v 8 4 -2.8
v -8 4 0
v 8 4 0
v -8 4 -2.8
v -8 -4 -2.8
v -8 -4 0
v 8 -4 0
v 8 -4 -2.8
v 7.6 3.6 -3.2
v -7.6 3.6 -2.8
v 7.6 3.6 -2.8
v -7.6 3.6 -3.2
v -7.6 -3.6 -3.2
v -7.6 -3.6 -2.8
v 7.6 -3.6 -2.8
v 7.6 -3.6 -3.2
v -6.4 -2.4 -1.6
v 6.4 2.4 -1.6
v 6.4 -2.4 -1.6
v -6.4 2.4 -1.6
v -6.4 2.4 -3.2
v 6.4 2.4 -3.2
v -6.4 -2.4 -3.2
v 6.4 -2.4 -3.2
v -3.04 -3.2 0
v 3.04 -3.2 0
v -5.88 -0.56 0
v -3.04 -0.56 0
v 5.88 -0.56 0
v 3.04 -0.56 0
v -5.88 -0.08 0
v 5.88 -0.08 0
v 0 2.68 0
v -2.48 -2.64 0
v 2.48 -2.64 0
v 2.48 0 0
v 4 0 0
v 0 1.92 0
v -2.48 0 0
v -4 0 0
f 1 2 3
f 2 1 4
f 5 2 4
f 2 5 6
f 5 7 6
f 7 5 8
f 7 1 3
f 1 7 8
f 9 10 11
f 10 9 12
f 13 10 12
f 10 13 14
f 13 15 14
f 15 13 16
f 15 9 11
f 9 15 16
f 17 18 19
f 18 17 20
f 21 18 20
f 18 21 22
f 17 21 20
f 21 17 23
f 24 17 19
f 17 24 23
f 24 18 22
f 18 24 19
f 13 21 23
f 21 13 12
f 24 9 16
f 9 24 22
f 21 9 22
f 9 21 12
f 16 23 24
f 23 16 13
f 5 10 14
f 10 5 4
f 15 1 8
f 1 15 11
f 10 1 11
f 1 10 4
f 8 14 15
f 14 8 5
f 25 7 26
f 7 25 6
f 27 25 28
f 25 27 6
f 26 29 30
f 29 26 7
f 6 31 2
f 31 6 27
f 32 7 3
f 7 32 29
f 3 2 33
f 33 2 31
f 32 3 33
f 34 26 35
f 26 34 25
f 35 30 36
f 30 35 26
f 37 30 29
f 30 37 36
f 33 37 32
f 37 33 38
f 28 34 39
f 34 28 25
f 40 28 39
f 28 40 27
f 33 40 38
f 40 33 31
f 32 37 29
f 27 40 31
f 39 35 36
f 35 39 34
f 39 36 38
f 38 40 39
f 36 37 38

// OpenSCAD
// file: ../p/box5.scad
use <../lib.scad>
function ldraw_lib__box5() = [
// 0 Box with 5 Faces and All Edges
// 0 Name: box5.dat
// 0 Author: James Jessiman
// 0 !LDRAW_ORG Primitive UPDATE 2012-01
// 0 !LICENSE Licensed under CC BY 2.0 and CC BY 4.0 : see CAreadme.txt
// 
// 0 BFC CERTIFY CCW
  [0,"BFC","CERTIFY"],
  [0,"BFC","CCW"],
// 
// 0 !HISTORY 2002-04-03 [sbliss] Modified for BFC compliance
// 0 !HISTORY 2002-04-25 [PTadmin] Official Update 2002-02
// 0 !HISTORY 2007-06-24 [PTadmin] Header formatted for Contributor Agreement
// 0 !HISTORY 2008-07-01 [PTadmin] Official Update 2008-01
// 0 !HISTORY 2012-02-16 [Philo] Changed to CCW
// 0 !HISTORY 2012-03-30 [PTadmin] Official Update 2012-01
// 
// 
// 2 24 1 1 1 -1 1 1
  [2,24,1,1,1,-1,1,1],
// 2 24 -1 1 1 -1 1 -1
  [2,24,-1,1,1,-1,1,-1],
// 2 24 -1 1 -1 1 1 -1
  [2,24,-1,1,-1,1,1,-1],
// 2 24 1 1 -1 1 1 1
  [2,24,1,1,-1,1,1,1],
// 2 24 1 0 1 -1 0 1
  [2,24,1,0,1,-1,0,1],
// 2 24 -1 0 1 -1 0 -1
  [2,24,-1,0,1,-1,0,-1],
// 2 24 -1 0 -1 1 0 -1
  [2,24,-1,0,-1,1,0,-1],
// 2 24 1 0 -1 1 0 1
  [2,24,1,0,-1,1,0,1],
// 2 24 1 0 1 1 1 1
  [2,24,1,0,1,1,1,1],
// 2 24 -1 0 1 -1 1 1
  [2,24,-1,0,1,-1,1,1],
// 2 24 1 0 -1 1 1 -1
  [2,24,1,0,-1,1,1,-1],
// 2 24 -1 0 -1 -1 1 -1
  [2,24,-1,0,-1,-1,1,-1],
// 4 16 -1 1 1 1 1 1 1 1 -1 -1 1 -1
  [4,16,-1,1,1,1,1,1,1,1,-1,-1,1,-1],
// 4 16 -1 1 1 -1 0 1 1 0 1 1 1 1
  [4,16,-1,1,1,-1,0,1,1,0,1,1,1,1],
// 4 16 -1 1 -1 -1 0 -1 -1 0 1 -1 1 1
  [4,16,-1,1,-1,-1,0,-1,-1,0,1,-1,1,1],
// 4 16 1 1 -1 1 0 -1 -1 0 -1 -1 1 -1
  [4,16,1,1,-1,1,0,-1,-1,0,-1,-1,1,-1],
// 4 16 1 1 1 1 0 1 1 0 -1 1 1 -1
  [4,16,1,1,1,1,0,1,1,0,-1,1,1,-1],
];
module ldraw_lib__box5(step=0, col=false, unit=2/5, alt=false, line=0.2, solid=!$preview)
    makepoly(ldraw_lib__box5(), step=step, col=col, unit=unit, alt=alt, line=line, solid=solid);
ldraw_lib__box5(line=0.2);
// file: ../p/box4.scad
use <../lib.scad>
function ldraw_lib__box4() = [
// 0 Box with 4 Faces (2 Parallel Pairs) and All Edges
// 0 Name: box4.dat
// 0 Author: James Jessiman
// 0 !LDRAW_ORG Primitive UPDATE 2012-01
// 0 !LICENSE Licensed under CC BY 2.0 and CC BY 4.0 : see CAreadme.txt
// 
// 0 BFC CERTIFY CCW
  [0,"BFC","CERTIFY"],
  [0,"BFC","CCW"],
// 
// 0 !HISTORY 2002-04-03 [sbliss] Modified for BFC compliance
// 0 !HISTORY 2002-04-25 [PTadmin] Official Update 2002-02
// 0 !HISTORY 2007-06-24 [PTadmin] Header formatted for Contributor Agreement
// 0 !HISTORY 2008-07-01 [PTadmin] Official Update 2008-01
// 0 !HISTORY 2012-02-16 [Philo] Changed to CCW
// 0 !HISTORY 2012-03-30 [PTadmin] Official Update 2012-01
// 
// 
// 2 24 1 1 1 -1 1 1
  [2,24,1,1,1,-1,1,1],
// 2 24 -1 1 1 -1 1 -1
  [2,24,-1,1,1,-1,1,-1],
// 2 24 -1 1 -1 1 1 -1
  [2,24,-1,1,-1,1,1,-1],
// 2 24 1 1 -1 1 1 1
  [2,24,1,1,-1,1,1,1],
// 2 24 1 0 1 -1 0 1
  [2,24,1,0,1,-1,0,1],
// 2 24 -1 0 1 -1 0 -1
  [2,24,-1,0,1,-1,0,-1],
// 2 24 -1 0 -1 1 0 -1
  [2,24,-1,0,-1,1,0,-1],
// 2 24 1 0 -1 1 0 1
  [2,24,1,0,-1,1,0,1],
// 2 24 1 0 1 1 1 1
  [2,24,1,0,1,1,1,1],
// 2 24 -1 0 1 -1 1 1
  [2,24,-1,0,1,-1,1,1],
// 2 24 1 0 -1 1 1 -1
  [2,24,1,0,-1,1,1,-1],
// 2 24 -1 0 -1 -1 1 -1
  [2,24,-1,0,-1,-1,1,-1],
// 4 16 -1 1 1 -1 0 1 1 0 1 1 1 1
  [4,16,-1,1,1,-1,0,1,1,0,1,1,1,1],
// 4 16 -1 1 -1 -1 0 -1 -1 0 1 -1 1 1
  [4,16,-1,1,-1,-1,0,-1,-1,0,1,-1,1,1],
// 4 16 1 1 -1 1 0 -1 -1 0 -1 -1 1 -1
  [4,16,1,1,-1,1,0,-1,-1,0,-1,-1,1,-1],
// 4 16 1 1 1 1 0 1 1 0 -1 1 1 -1
  [4,16,1,1,1,1,0,1,1,0,-1,1,1,-1],
];
module ldraw_lib__box4(step=0, col=false, unit=2/5, alt=false, line=0.2, solid=!$preview)
    makepoly(ldraw_lib__box4(), step=step, col=col, unit=unit, alt=alt, line=line, solid=solid);
ldraw_lib__box4(line=0.2);
// file: s/3069p13c.scad
use <../../lib.scad>
function ldraw_lib__s__3069p13c() = [
// 0 ~Tile  1 x  2 with Arrow Short Pattern - Arrow
// 0 Name: s\3069p13c.dat
// 0 Author: Alex Taylor [anathema]
// 0 !LDRAW_ORG Subpart UPDATE 2010-02
// 0 !LICENSE Licensed under CC BY 2.0 and CC BY 4.0 : see CAreadme.txt
// 
// 0 BFC CERTIFY CCW
  [0,"BFC","CERTIFY"],
  [0,"BFC","CCW"],
// 
// 0 !HISTORY 2010-07-05 [PTadmin] Official Update 2010-02
// 
// 
// 4 16 -6.2 0 -6.6 6.2 0 -6.6 6.2 0 0 -6.2 0 0
  [4,16,-6.2,0,-6.6,6.2,0,-6.6,6.2,0,0,-6.2,0,0],
// 3 16 -6.2 0 0 6.2 0 0 0 0 4.8
  [3,16,-6.2,0,0,6.2,0,0,0,0,4.8],
// 3 16 0 0 4.8 -10 0 0 -6.2 0 0
  [3,16,0,0,4.8,-10,0,0,-6.2,0,0],
// 3 16 6.2 0 0 10 0 0 0 0 4.8
  [3,16,6.2,0,0,10,0,0,0,0,4.8],
// 0
];
module ldraw_lib__s__3069p13c(step=0, col=false, unit=2/5, alt=false, line=0.2, solid=!$preview)
    makepoly(ldraw_lib__s__3069p13c(), step=step, col=col, unit=unit, alt=alt, line=line, solid=solid);
ldraw_lib__s__3069p13c(line=0.2);
// file: s/3069p13b.scad
use <../../lib.scad>
function ldraw_lib__s__3069p13b() = [
// 0 ~Tile  1 x  2 with Arrow Short Pattern - Border
// 0 Name: s\3069p13b.dat
// 0 Author: Alex Taylor [anathema]
// 0 !LDRAW_ORG Subpart UPDATE 2010-02
// 0 !LICENSE Licensed under CC BY 2.0 and CC BY 4.0 : see CAreadme.txt
// 
// 0 BFC CERTIFY CCW
  [0,"BFC","CERTIFY"],
  [0,"BFC","CCW"],
// 
// 0 !HISTORY 2010-07-05 [PTadmin] Official Update 2010-02
// 
// 
// 4 16 -7.6 0 -8 7.6 0 -8 6.2 0 -6.6 -6.2 0 -6.6
  [4,16,-7.6,0,-8,7.6,0,-8,6.2,0,-6.6,-6.2,0,-6.6],
// 4 16 6.2 0 0 6.2 0 -6.6 7.6 0 -8 7.6 0 -1.4
  [4,16,6.2,0,0,6.2,0,-6.6,7.6,0,-8,7.6,0,-1.4],
// 4 16 7.6 0 -1.4 14.7 0 -1.4 10 0 0 6.2 0 0
  [4,16,7.6,0,-1.4,14.7,0,-1.4,10,0,0,6.2,0,0],
// 4 16 0 0 4.8 10 0 0 14.7 0 -0.2 0 0 6.7
  [4,16,0,0,4.8,10,0,0,14.7,0,-0.2,0,0,6.7],
// 4 16 -7.6 0 -1.4 -7.6 0 -8 -6.2 0 -6.6 -6.2 0 0
  [4,16,-7.6,0,-1.4,-7.6,0,-8,-6.2,0,-6.6,-6.2,0,0],
// 4 16 -6.2 0 0 -10 0 0 -14.7 0 -1.4 -7.6 0 -1.4
  [4,16,-6.2,0,0,-10,0,0,-14.7,0,-1.4,-7.6,0,-1.4],
// 4 16 0 0 6.7 -14.7 0 -0.2 -10 0 0 0 0 4.8
  [4,16,0,0,6.7,-14.7,0,-0.2,-10,0,0,0,0,4.8],
// 3 16 14.7 0 -0.2 10 0 0 14.7 0 -1.4
  [3,16,14.7,0,-0.2,10,0,0,14.7,0,-1.4],
// 3 16 -14.7 0 -1.4 -10 0 0 -14.7 0 -0.2
  [3,16,-14.7,0,-1.4,-10,0,0,-14.7,0,-0.2],
// 0
];
module ldraw_lib__s__3069p13b(step=0, col=false, unit=2/5, alt=false, line=0.2, solid=!$preview)
    makepoly(ldraw_lib__s__3069p13b(), step=step, col=col, unit=unit, alt=alt, line=line, solid=solid);
ldraw_lib__s__3069p13b(line=0.2);
// file: s/3069p13a.scad
use <../../lib.scad>
function ldraw_lib__s__3069p13a() = [
// 0 ~Tile  1 x  2 with Arrow Short Pattern - Mask
// 0 Name: s\3069p13a.dat
// 0 Author: Alex Taylor [anathema]
// 0 !LDRAW_ORG Subpart UPDATE 2010-02
// 0 !LICENSE Licensed under CC BY 2.0 and CC BY 4.0 : see CAreadme.txt
// 
// 0 BFC CERTIFY CCW
  [0,"BFC","CERTIFY"],
  [0,"BFC","CCW"],
// 
// 0 !HISTORY 2010-07-05 [PTadmin] Official Update 2010-02
// 
// 
// 4 16 -20 0 -10 20 0 -10 7.6 0 -8 -7.6 0 -8
  [4,16,-20,0,-10,20,0,-10,7.6,0,-8,-7.6,0,-8],
// 4 16 -7.6 0 -8 -7.6 0 -1.4 -14.7 0 -1.4 -20 0 -10
  [4,16,-7.6,0,-8,-7.6,0,-1.4,-14.7,0,-1.4,-20,0,-10],
// 4 16 20 0 -10 14.7 0 -1.4 7.6 0 -1.4 7.6 0 -8
  [4,16,20,0,-10,14.7,0,-1.4,7.6,0,-1.4,7.6,0,-8],
// 4 16 -20 0 -10 -14.7 0 -1.4 -14.7 0 -0.2 -20 0 10
  [4,16,-20,0,-10,-14.7,0,-1.4,-14.7,0,-0.2,-20,0,10],
// 4 16 20 0 10 14.7 0 -0.2 14.7 0 -1.4 20 0 -10
  [4,16,20,0,10,14.7,0,-0.2,14.7,0,-1.4,20,0,-10],
// 3 16 20 0 10 -20 0 10 0 0 6.7
  [3,16,20,0,10,-20,0,10,0,0,6.7],
// 3 16 0 0 6.7 -20 0 10 -14.7 0 -0.2
  [3,16,0,0,6.7,-20,0,10,-14.7,0,-0.2],
// 3 16 14.7 0 -0.2 20 0 10 0 0 6.7
  [3,16,14.7,0,-0.2,20,0,10,0,0,6.7],
// 0
];
module ldraw_lib__s__3069p13a(step=0, col=false, unit=2/5, alt=false, line=0.2, solid=!$preview)
    makepoly(ldraw_lib__s__3069p13a(), step=step, col=col, unit=unit, alt=alt, line=line, solid=solid);
ldraw_lib__s__3069p13a(line=0.2);
// file: s/3069bs01.scad
use <../../lib.scad>
use <../../p/box4.scad>
use <../../p/box5.scad>
function ldraw_lib__s__3069bs01() = [
// 0 ~Tile  1 x  2 with Groove without Top Face
// 0 Name: s\3069bs01.dat
// 0 Author: Santeri Piippo [arezey]
// 0 !LDRAW_ORG Subpart UPDATE 2010-02
// 0 !LICENSE Licensed under CC BY 2.0 and CC BY 4.0 : see CAreadme.txt
// 
// 0 BFC CERTIFY CCW
  [0,"BFC","CERTIFY"],
  [0,"BFC","CCW"],
// 
// 0 !HISTORY 2010-07-05 [PTadmin] Official Update 2010-02
// 
// 
// 1 16 0 0 0 20 0 0 0 7 0 0 0 10 box4.dat
  [1,16,0,0,0,20,0,0,0,7,0,0,0,10, ldraw_lib__box4()],
// 1 16 0 7 0 19 0 0 0 1 0 0 0 9 box4.dat
  [1,16,0,7,0,19,0,0,0,1,0,0,0,9, ldraw_lib__box4()],
// 0 BFC INVERTNEXT
  [0,"BFC","INVERTNEXT"],
// 1 16 0 8 0 16 0 0 0 -4 0 0 0 6 box5.dat
  [1,16,0,8,0,16,0,0,0,-4,0,0,0,6, ldraw_lib__box5()],
// 4 16 -19 8 9 -16 8 6 -16 8 -6 -19 8 -9
  [4,16,-19,8,9,-16,8,6,-16,8,-6,-19,8,-9],
// 4 16 19 8 -9 16 8 -6 16 8 6 19 8 9
  [4,16,19,8,-9,16,8,-6,16,8,6,19,8,9],
// 4 16 19 8 9 16 8 6 -16 8 6 -19 8 9
  [4,16,19,8,9,16,8,6,-16,8,6,-19,8,9],
// 4 16 -19 8 -9 -16 8 -6 16 8 -6 19 8 -9
  [4,16,-19,8,-9,-16,8,-6,16,8,-6,19,8,-9],
// 4 16 -20 7 10 -19 7 9 -19 7 -9 -20 7 -10
  [4,16,-20,7,10,-19,7,9,-19,7,-9,-20,7,-10],
// 4 16 20 7 -10 19 7 -9 19 7 9 20 7 10
  [4,16,20,7,-10,19,7,-9,19,7,9,20,7,10],
// 4 16 20 7 10 19 7 9 -19 7 9 -20 7 10
  [4,16,20,7,10,19,7,9,-19,7,9,-20,7,10],
// 4 16 -20 7 -10 -19 7 -9 19 7 -9 20 7 -10
  [4,16,-20,7,-10,-19,7,-9,19,7,-9,20,7,-10],
// 0 //
];
module ldraw_lib__s__3069bs01(step=0, col=false, unit=2/5, alt=false, line=0.2, solid=!$preview)
    makepoly(ldraw_lib__s__3069bs01(), step=step, col=col, unit=unit, alt=alt, line=line, solid=solid);
ldraw_lib__s__3069bs01(line=0.2);
// file: 3069bp21.scad
use <../lib.scad>
use <s/3069bs01.scad>
use <s/3069p13a.scad>
use <s/3069p13b.scad>
use <s/3069p13c.scad>
function ldraw_lib__3069bp21() = [
// 0 Tile  1 x  2 with Arrow Short Yellow Pattern
// 0 Name: 3069bp21.dat
// 0 Author: James Jessiman
// 0 !LDRAW_ORG Part UPDATE 2010-02
// 0 !LICENSE Licensed under CC BY 2.0 and CC BY 4.0 : see CAreadme.txt
// 
// 0 BFC CERTIFY CCW
  [0,"BFC","CERTIFY"],
  [0,"BFC","CCW"],
// 
// 0 !HISTORY 2002-02-18 [PTadmin] Official Update 2002-01
// 0 !HISTORY 2003-06-08 [jriley] BFC compliant
// 0 !HISTORY 2003-12-19 [PTadmin] Official Update 2003-03
// 0 !HISTORY 2007-06-13 [PTadmin] Header formatted for Contributor Agreement
// 0 !HISTORY 2008-07-01 [PTadmin] Official Update 2008-01
// 0 !HISTORY 2009-08-15 [anathema] Rebuilt using new subparts
// 0 !HISTORY 2010-07-05 [PTadmin] Official Update 2010-02
// 
// 
// 1 16 0 0 0 1 0 0 0 1 0 0 0 1 s\3069bs01.dat
  [1,16,0,0,0,1,0,0,0,1,0,0,0,1, ldraw_lib__s__3069bs01()],
// 1 16 0 0 0 1 0 0 0 1 0 0 0 1 s\3069p13a.dat
  [1,16,0,0,0,1,0,0,0,1,0,0,0,1, ldraw_lib__s__3069p13a()],
// 1 16 0 0 0 1 0 0 0 1 0 0 0 1 s\3069p13b.dat
  [1,16,0,0,0,1,0,0,0,1,0,0,0,1, ldraw_lib__s__3069p13b()],
// 1 14 0 0 0 1 0 0 0 1 0 0 0 1 s\3069p13c.dat
  [1,14,0,0,0,1,0,0,0,1,0,0,0,1, ldraw_lib__s__3069p13c()],
// 0
];
module ldraw_lib__3069bp21(step=0, col=false, unit=2/5, alt=false, line=0.2, solid=!$preview)
    makepoly(ldraw_lib__3069bp21(), step=step, col=col, unit=unit, alt=alt, line=line, solid=solid);
ldraw_lib__3069bp21(line=0.2);
// main file
use <../lib.scad>
use <3069bp21.scad>
function ldraw_lib__3069p21() = [
// 0 ~Moved to 3069bp21
// 0 Name: 3069p21.dat
// 0 Author: [PTadmin]
// 0 !LDRAW_ORG Part UPDATE 2002-01
// 0 !LICENSE Licensed under CC BY 4.0 : see CAreadme.txt
// 
// 0 BFC CERTIFY CCW
  [0,"BFC","CERTIFY"],
  [0,"BFC","CCW"],
// 
// 0 !HISTORY 2002-02-18 [PTadmin] Official Update 2002-01
// 0 !HISTORY 2007-06-13 [PTadmin] Header formatted for Contributor Agreement
// 0 !HISTORY 2008-07-01 [PTadmin] Official Update 2008-01
// 
// 
// 1 16 0 0 0 1 0 0 0 1 0 0 0 1 3069bp21.dat
  [1,16,0,0,0,1,0,0,0,1,0,0,0,1, ldraw_lib__3069bp21()],
];
module ldraw_lib__3069p21(step=0, col=false, unit=2/5, alt=false, line=0.2, solid=!$preview)
    makepoly(ldraw_lib__3069p21(), step=step, col=col, unit=unit, alt=alt, line=line, solid=solid);
ldraw_lib__3069p21(line=0.2);
